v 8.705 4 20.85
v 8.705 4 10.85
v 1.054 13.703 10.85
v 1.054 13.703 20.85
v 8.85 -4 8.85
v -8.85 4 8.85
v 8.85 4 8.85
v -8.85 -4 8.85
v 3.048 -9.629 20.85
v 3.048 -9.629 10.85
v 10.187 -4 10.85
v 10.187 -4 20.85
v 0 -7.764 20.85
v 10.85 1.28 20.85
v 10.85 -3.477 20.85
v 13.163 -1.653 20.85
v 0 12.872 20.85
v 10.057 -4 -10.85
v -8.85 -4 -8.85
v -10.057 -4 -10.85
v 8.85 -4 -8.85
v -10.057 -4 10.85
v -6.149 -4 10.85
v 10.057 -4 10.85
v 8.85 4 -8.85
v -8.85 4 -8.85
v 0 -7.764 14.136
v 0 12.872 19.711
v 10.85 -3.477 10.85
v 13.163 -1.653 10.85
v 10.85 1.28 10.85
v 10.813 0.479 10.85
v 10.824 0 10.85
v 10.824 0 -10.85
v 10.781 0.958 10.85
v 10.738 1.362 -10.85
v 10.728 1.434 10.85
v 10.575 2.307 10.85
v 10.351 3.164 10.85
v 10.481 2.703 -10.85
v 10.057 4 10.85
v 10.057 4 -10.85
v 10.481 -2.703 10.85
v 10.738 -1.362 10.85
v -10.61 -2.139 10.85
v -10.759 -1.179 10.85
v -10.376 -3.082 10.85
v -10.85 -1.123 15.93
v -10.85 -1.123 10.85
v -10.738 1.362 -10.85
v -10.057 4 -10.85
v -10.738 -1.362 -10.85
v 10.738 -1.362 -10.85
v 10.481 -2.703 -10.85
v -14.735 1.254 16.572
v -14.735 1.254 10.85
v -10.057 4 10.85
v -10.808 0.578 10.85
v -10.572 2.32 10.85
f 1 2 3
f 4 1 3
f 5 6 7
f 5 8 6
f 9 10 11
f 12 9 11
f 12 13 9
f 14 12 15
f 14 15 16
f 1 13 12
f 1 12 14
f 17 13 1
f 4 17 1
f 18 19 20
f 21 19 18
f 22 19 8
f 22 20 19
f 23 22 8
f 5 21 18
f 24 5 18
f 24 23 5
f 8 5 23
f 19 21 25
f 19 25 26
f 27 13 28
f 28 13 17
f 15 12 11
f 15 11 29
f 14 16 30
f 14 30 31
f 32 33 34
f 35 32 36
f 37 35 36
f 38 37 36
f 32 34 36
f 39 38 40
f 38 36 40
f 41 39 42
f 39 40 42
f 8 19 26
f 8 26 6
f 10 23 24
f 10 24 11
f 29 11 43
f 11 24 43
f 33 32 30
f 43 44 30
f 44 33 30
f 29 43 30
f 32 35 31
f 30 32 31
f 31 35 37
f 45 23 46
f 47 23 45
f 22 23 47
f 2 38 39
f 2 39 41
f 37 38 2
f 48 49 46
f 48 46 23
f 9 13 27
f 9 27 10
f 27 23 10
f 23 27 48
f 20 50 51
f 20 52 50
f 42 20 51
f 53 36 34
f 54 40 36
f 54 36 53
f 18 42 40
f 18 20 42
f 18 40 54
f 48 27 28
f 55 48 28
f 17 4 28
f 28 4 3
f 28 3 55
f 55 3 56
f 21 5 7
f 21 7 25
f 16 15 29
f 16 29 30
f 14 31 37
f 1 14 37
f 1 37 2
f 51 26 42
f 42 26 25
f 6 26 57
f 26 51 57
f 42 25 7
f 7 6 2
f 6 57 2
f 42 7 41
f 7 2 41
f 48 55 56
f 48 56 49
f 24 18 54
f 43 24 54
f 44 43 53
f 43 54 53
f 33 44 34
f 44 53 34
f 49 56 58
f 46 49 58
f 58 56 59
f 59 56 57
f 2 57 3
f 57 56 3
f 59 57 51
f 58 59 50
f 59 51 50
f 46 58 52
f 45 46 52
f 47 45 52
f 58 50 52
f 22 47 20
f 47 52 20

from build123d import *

# Parameters (mm, degrees)
F1_DEPTH      = 4
F1_DEPTH_BACK = 4
F3_DEPTH      = 10
F5_DEPTH      = 25
F7_DEPTH      = 21.7


with BuildPart() as f1:
    # F0 (on Front) → F1 (new body, two sides)
    with BuildSketch(Plane.XZ) as f1_sk:
        Polygon((-10.85, 10.85), (-10.85, 0), (-10.85, -10.85), (0, -10.85), (10.85, -10.85), (10.85, 0), (10.85, 10.85), (0, 10.85), align=None)
        Polygon((8.85, 8.85), (8.85, 0), (8.85, -8.85), (0, -8.85), (-8.85, -8.85), (-8.85, 0), (-8.85, 8.85), (0, 8.85), align=None, mode=Mode.SUBTRACT)
    extrude(amount=F1_DEPTH)
    extrude(f1_sk.sketch, amount=-F1_DEPTH_BACK)

    # F2 (on face) → F3 (join)
    with BuildSketch(Plane.XY.offset(10.85)):
        Polygon((-14.7346977867, 1.2544146994), (-10.85, -1.1231439692), (-10.85, 4), (8.7051686149, 4), (1.0543529996, 13.7034736867), align=None)
        Polygon((-6.1494992707, -4), (10.1865680069, -4), (10.85, -3.4769094021), (10.85, 1.2797259855), (8.7051686149, 4), (-10.85, 4), (-10.85, -1.1231439692), align=None)
        Polygon((-6.1494992707, -4), (3.047517268, -9.6288667992), (10.1865680069, -4), align=None)
        Polygon((10.85, 1.2797259855), (10.85, -3.4769094021), (13.1626902148, -1.6534421593), align=None)
    extrude(amount=F3_DEPTH)

    # F4 (on Right) → F5 (cut)
    with BuildSketch(Plane.YZ):
        Polygon((-36.6991721094, 6.3178054057), (17.9703272879, 21.0884753615), (-36.6991721094, 33.6725451052), align=None)
    extrude(amount=-F5_DEPTH, mode=Mode.SUBTRACT)

    # F6 (on face) → F7 (cut)
    with BuildSketch(Plane(origin=(0, 0, -10.85), x_dir=(1, 0, 0), z_dir=(0, 0, -1))):
        with BuildLine():
            Line((13.9217844345, 4.8126999282), (9.694906495, 4.8126999282))
            ThreePointArc((9.694906495, 4.8126999282), (9.8845588749, 4.4100780486), (10.0574993187, 4))
            Line((10.0574993187, 4), (10.85, 4))
            Line((10.85, 4), (10.85, -4))
            Line((10.85, -4), (10.0574993187, -4))
            ThreePointArc((10.0574993187, -4), (9.8311449192, -4.52790041), (9.5771050518, -5.0430498086))
            Line((9.5771050518, -5.0430498086), (13.9217844345, -5.0430498086))
            Line((13.9217844345, -5.0430498086), (13.9217844345, 4.8126999282))
        make_face()
        with BuildLine():
            Line((10.85, 4), (10.0574993187, 4))
            ThreePointArc((10.0574993187, 4), (10.6304521223, 2.0363644618), (10.8237374574, 0))
            ThreePointArc((10.8237374574, 0), (10.6304521223, -2.0363644618), (10.0574993187, -4))
            Line((10.0574993187, -4), (10.85, -4))
            Line((10.85, -4), (10.85, 4))
        make_face()
        with BuildLine():
            ThreePointArc((-10.0574993187, -4), (-10.8237374574, 0), (-10.0574993187, 4))
            Line((-10.0574993187, 4), (-10.85, 4))
            Line((-10.85, 4), (-10.85, -4))
            Line((-10.85, -4), (-10.0574993187, -4))
        make_face()
    extrude(amount=-F7_DEPTH, mode=Mode.SUBTRACT)


solid = f1.part
